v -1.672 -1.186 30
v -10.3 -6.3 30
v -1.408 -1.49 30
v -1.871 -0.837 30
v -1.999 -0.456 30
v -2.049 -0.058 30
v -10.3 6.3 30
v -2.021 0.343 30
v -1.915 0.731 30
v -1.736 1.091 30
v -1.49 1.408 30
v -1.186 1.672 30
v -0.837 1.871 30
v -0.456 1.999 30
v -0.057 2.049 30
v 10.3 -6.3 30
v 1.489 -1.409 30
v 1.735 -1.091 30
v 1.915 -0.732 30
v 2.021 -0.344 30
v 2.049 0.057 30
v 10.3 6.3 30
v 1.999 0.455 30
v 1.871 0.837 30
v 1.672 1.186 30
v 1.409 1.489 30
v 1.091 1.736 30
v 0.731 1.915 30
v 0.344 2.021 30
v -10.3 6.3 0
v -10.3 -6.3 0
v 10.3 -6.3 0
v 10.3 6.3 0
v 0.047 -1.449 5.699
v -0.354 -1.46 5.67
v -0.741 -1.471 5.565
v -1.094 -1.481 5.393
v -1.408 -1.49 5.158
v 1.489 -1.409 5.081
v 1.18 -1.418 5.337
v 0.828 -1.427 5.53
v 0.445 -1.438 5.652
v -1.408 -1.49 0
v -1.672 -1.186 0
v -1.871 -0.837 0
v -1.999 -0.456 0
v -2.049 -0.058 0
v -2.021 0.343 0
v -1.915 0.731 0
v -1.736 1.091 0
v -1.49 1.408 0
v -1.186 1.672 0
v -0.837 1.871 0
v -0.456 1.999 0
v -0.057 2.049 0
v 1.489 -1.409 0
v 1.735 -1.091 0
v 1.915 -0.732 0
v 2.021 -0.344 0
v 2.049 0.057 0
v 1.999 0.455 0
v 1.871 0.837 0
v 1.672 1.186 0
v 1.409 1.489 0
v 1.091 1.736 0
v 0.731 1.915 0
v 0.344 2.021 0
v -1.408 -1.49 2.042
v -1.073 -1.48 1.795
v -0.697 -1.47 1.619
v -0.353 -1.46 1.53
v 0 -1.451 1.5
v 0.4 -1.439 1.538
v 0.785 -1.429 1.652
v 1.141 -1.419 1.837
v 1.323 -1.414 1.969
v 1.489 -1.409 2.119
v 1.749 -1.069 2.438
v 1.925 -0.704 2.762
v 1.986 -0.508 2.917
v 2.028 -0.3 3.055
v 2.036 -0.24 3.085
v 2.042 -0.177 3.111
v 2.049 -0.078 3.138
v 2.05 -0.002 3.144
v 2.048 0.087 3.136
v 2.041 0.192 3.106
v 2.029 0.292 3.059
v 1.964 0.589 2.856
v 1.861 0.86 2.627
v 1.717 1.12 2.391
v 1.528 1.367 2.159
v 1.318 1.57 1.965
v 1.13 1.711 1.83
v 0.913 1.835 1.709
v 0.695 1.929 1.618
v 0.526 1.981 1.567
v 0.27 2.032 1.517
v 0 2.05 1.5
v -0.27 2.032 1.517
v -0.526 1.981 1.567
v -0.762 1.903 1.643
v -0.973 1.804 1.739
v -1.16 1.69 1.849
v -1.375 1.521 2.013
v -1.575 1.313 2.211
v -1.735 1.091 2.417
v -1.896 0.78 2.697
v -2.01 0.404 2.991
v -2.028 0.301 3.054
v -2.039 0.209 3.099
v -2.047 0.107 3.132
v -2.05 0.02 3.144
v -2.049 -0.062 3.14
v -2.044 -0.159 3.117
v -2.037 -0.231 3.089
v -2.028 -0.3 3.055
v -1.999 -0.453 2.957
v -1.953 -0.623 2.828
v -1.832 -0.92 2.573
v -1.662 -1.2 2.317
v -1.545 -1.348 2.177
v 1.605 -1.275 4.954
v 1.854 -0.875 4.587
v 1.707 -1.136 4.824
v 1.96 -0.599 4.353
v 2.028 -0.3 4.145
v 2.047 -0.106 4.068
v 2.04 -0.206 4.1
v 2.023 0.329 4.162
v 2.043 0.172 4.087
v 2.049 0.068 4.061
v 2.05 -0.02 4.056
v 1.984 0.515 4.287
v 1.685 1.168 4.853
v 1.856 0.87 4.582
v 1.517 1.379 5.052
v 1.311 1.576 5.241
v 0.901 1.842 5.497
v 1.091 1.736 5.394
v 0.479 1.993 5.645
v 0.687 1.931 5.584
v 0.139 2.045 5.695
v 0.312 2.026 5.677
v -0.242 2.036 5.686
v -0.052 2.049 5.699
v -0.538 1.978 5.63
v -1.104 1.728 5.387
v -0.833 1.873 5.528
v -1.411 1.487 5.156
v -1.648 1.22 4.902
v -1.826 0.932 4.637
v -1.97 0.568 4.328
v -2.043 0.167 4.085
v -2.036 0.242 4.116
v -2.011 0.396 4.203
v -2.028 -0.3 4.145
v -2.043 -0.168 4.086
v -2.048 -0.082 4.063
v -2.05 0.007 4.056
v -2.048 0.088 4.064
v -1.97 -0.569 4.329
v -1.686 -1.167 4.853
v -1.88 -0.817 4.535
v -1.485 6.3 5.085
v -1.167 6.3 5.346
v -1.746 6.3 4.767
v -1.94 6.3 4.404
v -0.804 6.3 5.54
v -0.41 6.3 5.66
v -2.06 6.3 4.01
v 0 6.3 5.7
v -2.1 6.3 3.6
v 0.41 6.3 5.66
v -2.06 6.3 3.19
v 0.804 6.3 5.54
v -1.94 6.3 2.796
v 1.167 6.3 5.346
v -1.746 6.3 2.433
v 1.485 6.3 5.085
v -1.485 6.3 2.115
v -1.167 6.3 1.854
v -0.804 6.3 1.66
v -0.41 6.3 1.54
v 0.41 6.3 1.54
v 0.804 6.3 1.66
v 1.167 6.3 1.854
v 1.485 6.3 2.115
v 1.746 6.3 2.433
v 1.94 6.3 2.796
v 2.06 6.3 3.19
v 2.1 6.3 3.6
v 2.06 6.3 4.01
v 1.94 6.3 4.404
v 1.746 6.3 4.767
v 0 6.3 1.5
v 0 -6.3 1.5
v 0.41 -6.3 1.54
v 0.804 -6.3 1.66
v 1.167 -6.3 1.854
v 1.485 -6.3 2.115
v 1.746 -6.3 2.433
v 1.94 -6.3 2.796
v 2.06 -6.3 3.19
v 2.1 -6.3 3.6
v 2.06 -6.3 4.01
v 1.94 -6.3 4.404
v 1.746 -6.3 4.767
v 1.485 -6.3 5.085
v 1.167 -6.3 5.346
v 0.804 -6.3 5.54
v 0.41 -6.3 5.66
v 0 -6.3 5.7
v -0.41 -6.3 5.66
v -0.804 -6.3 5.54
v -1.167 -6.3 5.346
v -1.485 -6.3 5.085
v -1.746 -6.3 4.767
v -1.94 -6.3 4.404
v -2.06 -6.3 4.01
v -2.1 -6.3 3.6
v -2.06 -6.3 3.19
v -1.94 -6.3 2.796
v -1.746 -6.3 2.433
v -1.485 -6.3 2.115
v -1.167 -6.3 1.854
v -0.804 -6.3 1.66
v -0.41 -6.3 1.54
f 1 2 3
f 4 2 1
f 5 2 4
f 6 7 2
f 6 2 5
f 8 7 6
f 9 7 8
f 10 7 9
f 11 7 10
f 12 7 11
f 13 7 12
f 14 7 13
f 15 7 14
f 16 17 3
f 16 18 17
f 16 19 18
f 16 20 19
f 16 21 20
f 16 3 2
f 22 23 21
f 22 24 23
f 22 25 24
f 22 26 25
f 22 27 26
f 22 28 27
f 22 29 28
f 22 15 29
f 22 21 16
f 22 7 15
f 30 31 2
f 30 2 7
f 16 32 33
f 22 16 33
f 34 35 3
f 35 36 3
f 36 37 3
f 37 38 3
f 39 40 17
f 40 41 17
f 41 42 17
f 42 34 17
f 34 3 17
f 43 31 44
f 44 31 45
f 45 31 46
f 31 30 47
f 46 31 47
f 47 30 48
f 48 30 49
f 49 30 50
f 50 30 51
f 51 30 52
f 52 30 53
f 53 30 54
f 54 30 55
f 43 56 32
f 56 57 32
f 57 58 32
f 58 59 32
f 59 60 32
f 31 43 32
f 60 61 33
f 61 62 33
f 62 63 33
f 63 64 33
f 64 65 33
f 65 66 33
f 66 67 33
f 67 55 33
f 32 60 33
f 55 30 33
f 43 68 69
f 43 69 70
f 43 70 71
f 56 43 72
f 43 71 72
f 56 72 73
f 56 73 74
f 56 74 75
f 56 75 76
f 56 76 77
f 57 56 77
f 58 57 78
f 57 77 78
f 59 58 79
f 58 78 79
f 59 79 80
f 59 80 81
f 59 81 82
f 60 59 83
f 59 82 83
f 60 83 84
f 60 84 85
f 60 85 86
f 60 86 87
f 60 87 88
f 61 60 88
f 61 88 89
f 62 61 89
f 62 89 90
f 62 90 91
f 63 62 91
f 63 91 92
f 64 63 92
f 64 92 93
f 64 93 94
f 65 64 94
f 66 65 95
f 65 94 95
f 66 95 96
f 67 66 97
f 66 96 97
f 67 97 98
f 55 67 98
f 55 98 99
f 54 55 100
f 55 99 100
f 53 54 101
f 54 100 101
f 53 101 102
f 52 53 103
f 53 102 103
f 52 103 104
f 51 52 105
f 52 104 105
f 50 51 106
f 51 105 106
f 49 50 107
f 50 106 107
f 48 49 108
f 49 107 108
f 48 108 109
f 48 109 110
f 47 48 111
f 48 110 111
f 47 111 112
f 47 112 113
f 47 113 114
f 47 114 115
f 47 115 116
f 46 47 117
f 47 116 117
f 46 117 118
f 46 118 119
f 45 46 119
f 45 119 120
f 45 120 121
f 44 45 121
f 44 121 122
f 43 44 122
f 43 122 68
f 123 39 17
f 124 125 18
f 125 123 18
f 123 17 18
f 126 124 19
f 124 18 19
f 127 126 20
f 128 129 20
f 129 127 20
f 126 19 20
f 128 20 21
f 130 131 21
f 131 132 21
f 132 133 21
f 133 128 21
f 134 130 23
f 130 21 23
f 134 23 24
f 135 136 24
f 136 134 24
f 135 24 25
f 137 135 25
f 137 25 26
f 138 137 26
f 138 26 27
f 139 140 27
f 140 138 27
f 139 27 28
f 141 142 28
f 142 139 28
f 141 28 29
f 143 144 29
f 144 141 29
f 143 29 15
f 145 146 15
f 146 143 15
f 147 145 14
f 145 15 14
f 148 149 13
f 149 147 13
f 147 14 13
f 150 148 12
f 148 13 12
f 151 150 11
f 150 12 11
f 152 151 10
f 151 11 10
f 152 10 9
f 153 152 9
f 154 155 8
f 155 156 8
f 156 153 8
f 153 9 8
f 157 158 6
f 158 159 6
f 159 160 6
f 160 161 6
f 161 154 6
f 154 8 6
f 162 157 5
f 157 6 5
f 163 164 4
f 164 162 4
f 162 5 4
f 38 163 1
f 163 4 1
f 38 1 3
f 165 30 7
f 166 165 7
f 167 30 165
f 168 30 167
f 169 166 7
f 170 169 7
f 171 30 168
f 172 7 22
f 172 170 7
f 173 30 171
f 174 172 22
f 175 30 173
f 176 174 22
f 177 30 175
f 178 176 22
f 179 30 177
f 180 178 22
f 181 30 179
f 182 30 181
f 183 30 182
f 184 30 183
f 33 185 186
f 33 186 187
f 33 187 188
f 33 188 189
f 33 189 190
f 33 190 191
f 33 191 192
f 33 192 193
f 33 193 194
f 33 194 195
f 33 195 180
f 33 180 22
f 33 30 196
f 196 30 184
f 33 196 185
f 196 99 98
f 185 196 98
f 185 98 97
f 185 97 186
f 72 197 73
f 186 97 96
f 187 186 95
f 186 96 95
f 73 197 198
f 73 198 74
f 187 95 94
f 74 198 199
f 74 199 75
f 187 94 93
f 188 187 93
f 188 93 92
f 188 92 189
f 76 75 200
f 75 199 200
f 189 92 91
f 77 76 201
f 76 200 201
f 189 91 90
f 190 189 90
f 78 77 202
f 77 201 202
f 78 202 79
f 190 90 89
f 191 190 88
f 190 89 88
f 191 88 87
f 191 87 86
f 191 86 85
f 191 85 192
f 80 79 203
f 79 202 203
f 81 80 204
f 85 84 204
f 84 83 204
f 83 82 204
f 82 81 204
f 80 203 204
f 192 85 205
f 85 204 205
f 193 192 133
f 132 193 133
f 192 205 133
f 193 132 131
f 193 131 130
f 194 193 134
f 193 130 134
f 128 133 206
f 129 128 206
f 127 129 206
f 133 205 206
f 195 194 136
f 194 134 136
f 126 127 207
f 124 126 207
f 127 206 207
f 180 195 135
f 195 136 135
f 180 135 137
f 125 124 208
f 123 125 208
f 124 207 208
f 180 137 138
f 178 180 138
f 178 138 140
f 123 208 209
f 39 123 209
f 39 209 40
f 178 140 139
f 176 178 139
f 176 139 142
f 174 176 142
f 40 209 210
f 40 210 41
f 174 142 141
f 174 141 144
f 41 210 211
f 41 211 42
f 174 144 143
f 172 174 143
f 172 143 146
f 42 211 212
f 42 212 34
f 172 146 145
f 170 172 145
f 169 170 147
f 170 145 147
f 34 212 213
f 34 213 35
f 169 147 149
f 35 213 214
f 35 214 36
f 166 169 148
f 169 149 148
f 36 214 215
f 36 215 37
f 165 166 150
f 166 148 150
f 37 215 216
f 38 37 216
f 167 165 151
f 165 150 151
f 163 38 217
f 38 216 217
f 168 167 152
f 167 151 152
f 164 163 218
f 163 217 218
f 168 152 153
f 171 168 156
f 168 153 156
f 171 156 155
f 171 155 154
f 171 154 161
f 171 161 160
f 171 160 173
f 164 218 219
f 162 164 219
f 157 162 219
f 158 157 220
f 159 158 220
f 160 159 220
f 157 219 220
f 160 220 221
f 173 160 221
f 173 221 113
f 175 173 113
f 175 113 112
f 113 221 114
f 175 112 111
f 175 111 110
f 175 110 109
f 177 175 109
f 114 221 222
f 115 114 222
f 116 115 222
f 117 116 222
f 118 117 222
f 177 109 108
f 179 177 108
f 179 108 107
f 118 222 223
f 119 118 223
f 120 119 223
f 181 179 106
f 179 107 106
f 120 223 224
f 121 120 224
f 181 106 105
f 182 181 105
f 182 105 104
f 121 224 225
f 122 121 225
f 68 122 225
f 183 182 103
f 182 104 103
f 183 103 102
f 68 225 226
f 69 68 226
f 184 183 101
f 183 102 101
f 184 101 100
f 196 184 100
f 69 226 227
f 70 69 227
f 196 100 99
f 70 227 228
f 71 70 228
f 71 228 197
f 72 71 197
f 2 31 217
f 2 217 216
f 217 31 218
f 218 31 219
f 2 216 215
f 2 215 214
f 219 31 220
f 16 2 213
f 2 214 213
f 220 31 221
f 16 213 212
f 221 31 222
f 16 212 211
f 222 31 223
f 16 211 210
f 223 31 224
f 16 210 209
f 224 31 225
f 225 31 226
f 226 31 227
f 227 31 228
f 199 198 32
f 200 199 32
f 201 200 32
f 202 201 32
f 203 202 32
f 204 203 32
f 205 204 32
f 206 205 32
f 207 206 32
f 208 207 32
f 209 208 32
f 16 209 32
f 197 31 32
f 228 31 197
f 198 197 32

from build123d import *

# Parameters (mm, degrees)
SKETCH_2_W          = 20.6
SKETCH_2_H          = 12.6
EXTRUDE_1_DEPTH     = 30
CUT_EXTRUDE_1_DEPTH = 30
SKETCH_4_R          = 2.1
CUT_EXTRUDE_3_DEPTH = 6
SKETCH_6_R          = 2.1
CUT_EXTRUDE_4_DEPTH = 30


with BuildPart() as part:
    # Эскиз2 → Бобышка-Вытянуть1 (new body)
    with BuildSketch(Plane.XY):
        Rectangle(SKETCH_2_W, SKETCH_2_H)
    extrude(amount=EXTRUDE_1_DEPTH)

    # Эскиз3 → Вырез-Вытянуть1 (cut)
    with BuildSketch(Plane.XY.offset(30)):
        with BuildLine():
            Line((-1.408154236, -1.489832758), (1.488994806, -1.409040265))
            ThreePointArc((1.488994806, -1.409040265), (-0.05714592, 2.049203344), (-1.408154236, -1.489832758))
        make_face()
    extrude(amount=-CUT_EXTRUDE_1_DEPTH, mode=Mode.SUBTRACT)

    # Эскиз4 → Вырез-Вытянуть3 (cut)
    with BuildSketch(Plane.XZ.offset(6.3)):
        with Locations(Location((0, 3.6, 0), (0, 0, 270))):
            Circle(SKETCH_4_R)
    extrude(amount=-CUT_EXTRUDE_3_DEPTH, mode=Mode.SUBTRACT)

    # Эскиз6 → Вырез-Вытянуть4 (cut)
    with BuildSketch(Plane.XZ.offset(6.3)):
        with Locations(Location((0, 3.6, 0), (0, 0, 270))):
            Circle(SKETCH_6_R)
    extrude(amount=-CUT_EXTRUDE_4_DEPTH, mode=Mode.SUBTRACT)


solid = part.part
